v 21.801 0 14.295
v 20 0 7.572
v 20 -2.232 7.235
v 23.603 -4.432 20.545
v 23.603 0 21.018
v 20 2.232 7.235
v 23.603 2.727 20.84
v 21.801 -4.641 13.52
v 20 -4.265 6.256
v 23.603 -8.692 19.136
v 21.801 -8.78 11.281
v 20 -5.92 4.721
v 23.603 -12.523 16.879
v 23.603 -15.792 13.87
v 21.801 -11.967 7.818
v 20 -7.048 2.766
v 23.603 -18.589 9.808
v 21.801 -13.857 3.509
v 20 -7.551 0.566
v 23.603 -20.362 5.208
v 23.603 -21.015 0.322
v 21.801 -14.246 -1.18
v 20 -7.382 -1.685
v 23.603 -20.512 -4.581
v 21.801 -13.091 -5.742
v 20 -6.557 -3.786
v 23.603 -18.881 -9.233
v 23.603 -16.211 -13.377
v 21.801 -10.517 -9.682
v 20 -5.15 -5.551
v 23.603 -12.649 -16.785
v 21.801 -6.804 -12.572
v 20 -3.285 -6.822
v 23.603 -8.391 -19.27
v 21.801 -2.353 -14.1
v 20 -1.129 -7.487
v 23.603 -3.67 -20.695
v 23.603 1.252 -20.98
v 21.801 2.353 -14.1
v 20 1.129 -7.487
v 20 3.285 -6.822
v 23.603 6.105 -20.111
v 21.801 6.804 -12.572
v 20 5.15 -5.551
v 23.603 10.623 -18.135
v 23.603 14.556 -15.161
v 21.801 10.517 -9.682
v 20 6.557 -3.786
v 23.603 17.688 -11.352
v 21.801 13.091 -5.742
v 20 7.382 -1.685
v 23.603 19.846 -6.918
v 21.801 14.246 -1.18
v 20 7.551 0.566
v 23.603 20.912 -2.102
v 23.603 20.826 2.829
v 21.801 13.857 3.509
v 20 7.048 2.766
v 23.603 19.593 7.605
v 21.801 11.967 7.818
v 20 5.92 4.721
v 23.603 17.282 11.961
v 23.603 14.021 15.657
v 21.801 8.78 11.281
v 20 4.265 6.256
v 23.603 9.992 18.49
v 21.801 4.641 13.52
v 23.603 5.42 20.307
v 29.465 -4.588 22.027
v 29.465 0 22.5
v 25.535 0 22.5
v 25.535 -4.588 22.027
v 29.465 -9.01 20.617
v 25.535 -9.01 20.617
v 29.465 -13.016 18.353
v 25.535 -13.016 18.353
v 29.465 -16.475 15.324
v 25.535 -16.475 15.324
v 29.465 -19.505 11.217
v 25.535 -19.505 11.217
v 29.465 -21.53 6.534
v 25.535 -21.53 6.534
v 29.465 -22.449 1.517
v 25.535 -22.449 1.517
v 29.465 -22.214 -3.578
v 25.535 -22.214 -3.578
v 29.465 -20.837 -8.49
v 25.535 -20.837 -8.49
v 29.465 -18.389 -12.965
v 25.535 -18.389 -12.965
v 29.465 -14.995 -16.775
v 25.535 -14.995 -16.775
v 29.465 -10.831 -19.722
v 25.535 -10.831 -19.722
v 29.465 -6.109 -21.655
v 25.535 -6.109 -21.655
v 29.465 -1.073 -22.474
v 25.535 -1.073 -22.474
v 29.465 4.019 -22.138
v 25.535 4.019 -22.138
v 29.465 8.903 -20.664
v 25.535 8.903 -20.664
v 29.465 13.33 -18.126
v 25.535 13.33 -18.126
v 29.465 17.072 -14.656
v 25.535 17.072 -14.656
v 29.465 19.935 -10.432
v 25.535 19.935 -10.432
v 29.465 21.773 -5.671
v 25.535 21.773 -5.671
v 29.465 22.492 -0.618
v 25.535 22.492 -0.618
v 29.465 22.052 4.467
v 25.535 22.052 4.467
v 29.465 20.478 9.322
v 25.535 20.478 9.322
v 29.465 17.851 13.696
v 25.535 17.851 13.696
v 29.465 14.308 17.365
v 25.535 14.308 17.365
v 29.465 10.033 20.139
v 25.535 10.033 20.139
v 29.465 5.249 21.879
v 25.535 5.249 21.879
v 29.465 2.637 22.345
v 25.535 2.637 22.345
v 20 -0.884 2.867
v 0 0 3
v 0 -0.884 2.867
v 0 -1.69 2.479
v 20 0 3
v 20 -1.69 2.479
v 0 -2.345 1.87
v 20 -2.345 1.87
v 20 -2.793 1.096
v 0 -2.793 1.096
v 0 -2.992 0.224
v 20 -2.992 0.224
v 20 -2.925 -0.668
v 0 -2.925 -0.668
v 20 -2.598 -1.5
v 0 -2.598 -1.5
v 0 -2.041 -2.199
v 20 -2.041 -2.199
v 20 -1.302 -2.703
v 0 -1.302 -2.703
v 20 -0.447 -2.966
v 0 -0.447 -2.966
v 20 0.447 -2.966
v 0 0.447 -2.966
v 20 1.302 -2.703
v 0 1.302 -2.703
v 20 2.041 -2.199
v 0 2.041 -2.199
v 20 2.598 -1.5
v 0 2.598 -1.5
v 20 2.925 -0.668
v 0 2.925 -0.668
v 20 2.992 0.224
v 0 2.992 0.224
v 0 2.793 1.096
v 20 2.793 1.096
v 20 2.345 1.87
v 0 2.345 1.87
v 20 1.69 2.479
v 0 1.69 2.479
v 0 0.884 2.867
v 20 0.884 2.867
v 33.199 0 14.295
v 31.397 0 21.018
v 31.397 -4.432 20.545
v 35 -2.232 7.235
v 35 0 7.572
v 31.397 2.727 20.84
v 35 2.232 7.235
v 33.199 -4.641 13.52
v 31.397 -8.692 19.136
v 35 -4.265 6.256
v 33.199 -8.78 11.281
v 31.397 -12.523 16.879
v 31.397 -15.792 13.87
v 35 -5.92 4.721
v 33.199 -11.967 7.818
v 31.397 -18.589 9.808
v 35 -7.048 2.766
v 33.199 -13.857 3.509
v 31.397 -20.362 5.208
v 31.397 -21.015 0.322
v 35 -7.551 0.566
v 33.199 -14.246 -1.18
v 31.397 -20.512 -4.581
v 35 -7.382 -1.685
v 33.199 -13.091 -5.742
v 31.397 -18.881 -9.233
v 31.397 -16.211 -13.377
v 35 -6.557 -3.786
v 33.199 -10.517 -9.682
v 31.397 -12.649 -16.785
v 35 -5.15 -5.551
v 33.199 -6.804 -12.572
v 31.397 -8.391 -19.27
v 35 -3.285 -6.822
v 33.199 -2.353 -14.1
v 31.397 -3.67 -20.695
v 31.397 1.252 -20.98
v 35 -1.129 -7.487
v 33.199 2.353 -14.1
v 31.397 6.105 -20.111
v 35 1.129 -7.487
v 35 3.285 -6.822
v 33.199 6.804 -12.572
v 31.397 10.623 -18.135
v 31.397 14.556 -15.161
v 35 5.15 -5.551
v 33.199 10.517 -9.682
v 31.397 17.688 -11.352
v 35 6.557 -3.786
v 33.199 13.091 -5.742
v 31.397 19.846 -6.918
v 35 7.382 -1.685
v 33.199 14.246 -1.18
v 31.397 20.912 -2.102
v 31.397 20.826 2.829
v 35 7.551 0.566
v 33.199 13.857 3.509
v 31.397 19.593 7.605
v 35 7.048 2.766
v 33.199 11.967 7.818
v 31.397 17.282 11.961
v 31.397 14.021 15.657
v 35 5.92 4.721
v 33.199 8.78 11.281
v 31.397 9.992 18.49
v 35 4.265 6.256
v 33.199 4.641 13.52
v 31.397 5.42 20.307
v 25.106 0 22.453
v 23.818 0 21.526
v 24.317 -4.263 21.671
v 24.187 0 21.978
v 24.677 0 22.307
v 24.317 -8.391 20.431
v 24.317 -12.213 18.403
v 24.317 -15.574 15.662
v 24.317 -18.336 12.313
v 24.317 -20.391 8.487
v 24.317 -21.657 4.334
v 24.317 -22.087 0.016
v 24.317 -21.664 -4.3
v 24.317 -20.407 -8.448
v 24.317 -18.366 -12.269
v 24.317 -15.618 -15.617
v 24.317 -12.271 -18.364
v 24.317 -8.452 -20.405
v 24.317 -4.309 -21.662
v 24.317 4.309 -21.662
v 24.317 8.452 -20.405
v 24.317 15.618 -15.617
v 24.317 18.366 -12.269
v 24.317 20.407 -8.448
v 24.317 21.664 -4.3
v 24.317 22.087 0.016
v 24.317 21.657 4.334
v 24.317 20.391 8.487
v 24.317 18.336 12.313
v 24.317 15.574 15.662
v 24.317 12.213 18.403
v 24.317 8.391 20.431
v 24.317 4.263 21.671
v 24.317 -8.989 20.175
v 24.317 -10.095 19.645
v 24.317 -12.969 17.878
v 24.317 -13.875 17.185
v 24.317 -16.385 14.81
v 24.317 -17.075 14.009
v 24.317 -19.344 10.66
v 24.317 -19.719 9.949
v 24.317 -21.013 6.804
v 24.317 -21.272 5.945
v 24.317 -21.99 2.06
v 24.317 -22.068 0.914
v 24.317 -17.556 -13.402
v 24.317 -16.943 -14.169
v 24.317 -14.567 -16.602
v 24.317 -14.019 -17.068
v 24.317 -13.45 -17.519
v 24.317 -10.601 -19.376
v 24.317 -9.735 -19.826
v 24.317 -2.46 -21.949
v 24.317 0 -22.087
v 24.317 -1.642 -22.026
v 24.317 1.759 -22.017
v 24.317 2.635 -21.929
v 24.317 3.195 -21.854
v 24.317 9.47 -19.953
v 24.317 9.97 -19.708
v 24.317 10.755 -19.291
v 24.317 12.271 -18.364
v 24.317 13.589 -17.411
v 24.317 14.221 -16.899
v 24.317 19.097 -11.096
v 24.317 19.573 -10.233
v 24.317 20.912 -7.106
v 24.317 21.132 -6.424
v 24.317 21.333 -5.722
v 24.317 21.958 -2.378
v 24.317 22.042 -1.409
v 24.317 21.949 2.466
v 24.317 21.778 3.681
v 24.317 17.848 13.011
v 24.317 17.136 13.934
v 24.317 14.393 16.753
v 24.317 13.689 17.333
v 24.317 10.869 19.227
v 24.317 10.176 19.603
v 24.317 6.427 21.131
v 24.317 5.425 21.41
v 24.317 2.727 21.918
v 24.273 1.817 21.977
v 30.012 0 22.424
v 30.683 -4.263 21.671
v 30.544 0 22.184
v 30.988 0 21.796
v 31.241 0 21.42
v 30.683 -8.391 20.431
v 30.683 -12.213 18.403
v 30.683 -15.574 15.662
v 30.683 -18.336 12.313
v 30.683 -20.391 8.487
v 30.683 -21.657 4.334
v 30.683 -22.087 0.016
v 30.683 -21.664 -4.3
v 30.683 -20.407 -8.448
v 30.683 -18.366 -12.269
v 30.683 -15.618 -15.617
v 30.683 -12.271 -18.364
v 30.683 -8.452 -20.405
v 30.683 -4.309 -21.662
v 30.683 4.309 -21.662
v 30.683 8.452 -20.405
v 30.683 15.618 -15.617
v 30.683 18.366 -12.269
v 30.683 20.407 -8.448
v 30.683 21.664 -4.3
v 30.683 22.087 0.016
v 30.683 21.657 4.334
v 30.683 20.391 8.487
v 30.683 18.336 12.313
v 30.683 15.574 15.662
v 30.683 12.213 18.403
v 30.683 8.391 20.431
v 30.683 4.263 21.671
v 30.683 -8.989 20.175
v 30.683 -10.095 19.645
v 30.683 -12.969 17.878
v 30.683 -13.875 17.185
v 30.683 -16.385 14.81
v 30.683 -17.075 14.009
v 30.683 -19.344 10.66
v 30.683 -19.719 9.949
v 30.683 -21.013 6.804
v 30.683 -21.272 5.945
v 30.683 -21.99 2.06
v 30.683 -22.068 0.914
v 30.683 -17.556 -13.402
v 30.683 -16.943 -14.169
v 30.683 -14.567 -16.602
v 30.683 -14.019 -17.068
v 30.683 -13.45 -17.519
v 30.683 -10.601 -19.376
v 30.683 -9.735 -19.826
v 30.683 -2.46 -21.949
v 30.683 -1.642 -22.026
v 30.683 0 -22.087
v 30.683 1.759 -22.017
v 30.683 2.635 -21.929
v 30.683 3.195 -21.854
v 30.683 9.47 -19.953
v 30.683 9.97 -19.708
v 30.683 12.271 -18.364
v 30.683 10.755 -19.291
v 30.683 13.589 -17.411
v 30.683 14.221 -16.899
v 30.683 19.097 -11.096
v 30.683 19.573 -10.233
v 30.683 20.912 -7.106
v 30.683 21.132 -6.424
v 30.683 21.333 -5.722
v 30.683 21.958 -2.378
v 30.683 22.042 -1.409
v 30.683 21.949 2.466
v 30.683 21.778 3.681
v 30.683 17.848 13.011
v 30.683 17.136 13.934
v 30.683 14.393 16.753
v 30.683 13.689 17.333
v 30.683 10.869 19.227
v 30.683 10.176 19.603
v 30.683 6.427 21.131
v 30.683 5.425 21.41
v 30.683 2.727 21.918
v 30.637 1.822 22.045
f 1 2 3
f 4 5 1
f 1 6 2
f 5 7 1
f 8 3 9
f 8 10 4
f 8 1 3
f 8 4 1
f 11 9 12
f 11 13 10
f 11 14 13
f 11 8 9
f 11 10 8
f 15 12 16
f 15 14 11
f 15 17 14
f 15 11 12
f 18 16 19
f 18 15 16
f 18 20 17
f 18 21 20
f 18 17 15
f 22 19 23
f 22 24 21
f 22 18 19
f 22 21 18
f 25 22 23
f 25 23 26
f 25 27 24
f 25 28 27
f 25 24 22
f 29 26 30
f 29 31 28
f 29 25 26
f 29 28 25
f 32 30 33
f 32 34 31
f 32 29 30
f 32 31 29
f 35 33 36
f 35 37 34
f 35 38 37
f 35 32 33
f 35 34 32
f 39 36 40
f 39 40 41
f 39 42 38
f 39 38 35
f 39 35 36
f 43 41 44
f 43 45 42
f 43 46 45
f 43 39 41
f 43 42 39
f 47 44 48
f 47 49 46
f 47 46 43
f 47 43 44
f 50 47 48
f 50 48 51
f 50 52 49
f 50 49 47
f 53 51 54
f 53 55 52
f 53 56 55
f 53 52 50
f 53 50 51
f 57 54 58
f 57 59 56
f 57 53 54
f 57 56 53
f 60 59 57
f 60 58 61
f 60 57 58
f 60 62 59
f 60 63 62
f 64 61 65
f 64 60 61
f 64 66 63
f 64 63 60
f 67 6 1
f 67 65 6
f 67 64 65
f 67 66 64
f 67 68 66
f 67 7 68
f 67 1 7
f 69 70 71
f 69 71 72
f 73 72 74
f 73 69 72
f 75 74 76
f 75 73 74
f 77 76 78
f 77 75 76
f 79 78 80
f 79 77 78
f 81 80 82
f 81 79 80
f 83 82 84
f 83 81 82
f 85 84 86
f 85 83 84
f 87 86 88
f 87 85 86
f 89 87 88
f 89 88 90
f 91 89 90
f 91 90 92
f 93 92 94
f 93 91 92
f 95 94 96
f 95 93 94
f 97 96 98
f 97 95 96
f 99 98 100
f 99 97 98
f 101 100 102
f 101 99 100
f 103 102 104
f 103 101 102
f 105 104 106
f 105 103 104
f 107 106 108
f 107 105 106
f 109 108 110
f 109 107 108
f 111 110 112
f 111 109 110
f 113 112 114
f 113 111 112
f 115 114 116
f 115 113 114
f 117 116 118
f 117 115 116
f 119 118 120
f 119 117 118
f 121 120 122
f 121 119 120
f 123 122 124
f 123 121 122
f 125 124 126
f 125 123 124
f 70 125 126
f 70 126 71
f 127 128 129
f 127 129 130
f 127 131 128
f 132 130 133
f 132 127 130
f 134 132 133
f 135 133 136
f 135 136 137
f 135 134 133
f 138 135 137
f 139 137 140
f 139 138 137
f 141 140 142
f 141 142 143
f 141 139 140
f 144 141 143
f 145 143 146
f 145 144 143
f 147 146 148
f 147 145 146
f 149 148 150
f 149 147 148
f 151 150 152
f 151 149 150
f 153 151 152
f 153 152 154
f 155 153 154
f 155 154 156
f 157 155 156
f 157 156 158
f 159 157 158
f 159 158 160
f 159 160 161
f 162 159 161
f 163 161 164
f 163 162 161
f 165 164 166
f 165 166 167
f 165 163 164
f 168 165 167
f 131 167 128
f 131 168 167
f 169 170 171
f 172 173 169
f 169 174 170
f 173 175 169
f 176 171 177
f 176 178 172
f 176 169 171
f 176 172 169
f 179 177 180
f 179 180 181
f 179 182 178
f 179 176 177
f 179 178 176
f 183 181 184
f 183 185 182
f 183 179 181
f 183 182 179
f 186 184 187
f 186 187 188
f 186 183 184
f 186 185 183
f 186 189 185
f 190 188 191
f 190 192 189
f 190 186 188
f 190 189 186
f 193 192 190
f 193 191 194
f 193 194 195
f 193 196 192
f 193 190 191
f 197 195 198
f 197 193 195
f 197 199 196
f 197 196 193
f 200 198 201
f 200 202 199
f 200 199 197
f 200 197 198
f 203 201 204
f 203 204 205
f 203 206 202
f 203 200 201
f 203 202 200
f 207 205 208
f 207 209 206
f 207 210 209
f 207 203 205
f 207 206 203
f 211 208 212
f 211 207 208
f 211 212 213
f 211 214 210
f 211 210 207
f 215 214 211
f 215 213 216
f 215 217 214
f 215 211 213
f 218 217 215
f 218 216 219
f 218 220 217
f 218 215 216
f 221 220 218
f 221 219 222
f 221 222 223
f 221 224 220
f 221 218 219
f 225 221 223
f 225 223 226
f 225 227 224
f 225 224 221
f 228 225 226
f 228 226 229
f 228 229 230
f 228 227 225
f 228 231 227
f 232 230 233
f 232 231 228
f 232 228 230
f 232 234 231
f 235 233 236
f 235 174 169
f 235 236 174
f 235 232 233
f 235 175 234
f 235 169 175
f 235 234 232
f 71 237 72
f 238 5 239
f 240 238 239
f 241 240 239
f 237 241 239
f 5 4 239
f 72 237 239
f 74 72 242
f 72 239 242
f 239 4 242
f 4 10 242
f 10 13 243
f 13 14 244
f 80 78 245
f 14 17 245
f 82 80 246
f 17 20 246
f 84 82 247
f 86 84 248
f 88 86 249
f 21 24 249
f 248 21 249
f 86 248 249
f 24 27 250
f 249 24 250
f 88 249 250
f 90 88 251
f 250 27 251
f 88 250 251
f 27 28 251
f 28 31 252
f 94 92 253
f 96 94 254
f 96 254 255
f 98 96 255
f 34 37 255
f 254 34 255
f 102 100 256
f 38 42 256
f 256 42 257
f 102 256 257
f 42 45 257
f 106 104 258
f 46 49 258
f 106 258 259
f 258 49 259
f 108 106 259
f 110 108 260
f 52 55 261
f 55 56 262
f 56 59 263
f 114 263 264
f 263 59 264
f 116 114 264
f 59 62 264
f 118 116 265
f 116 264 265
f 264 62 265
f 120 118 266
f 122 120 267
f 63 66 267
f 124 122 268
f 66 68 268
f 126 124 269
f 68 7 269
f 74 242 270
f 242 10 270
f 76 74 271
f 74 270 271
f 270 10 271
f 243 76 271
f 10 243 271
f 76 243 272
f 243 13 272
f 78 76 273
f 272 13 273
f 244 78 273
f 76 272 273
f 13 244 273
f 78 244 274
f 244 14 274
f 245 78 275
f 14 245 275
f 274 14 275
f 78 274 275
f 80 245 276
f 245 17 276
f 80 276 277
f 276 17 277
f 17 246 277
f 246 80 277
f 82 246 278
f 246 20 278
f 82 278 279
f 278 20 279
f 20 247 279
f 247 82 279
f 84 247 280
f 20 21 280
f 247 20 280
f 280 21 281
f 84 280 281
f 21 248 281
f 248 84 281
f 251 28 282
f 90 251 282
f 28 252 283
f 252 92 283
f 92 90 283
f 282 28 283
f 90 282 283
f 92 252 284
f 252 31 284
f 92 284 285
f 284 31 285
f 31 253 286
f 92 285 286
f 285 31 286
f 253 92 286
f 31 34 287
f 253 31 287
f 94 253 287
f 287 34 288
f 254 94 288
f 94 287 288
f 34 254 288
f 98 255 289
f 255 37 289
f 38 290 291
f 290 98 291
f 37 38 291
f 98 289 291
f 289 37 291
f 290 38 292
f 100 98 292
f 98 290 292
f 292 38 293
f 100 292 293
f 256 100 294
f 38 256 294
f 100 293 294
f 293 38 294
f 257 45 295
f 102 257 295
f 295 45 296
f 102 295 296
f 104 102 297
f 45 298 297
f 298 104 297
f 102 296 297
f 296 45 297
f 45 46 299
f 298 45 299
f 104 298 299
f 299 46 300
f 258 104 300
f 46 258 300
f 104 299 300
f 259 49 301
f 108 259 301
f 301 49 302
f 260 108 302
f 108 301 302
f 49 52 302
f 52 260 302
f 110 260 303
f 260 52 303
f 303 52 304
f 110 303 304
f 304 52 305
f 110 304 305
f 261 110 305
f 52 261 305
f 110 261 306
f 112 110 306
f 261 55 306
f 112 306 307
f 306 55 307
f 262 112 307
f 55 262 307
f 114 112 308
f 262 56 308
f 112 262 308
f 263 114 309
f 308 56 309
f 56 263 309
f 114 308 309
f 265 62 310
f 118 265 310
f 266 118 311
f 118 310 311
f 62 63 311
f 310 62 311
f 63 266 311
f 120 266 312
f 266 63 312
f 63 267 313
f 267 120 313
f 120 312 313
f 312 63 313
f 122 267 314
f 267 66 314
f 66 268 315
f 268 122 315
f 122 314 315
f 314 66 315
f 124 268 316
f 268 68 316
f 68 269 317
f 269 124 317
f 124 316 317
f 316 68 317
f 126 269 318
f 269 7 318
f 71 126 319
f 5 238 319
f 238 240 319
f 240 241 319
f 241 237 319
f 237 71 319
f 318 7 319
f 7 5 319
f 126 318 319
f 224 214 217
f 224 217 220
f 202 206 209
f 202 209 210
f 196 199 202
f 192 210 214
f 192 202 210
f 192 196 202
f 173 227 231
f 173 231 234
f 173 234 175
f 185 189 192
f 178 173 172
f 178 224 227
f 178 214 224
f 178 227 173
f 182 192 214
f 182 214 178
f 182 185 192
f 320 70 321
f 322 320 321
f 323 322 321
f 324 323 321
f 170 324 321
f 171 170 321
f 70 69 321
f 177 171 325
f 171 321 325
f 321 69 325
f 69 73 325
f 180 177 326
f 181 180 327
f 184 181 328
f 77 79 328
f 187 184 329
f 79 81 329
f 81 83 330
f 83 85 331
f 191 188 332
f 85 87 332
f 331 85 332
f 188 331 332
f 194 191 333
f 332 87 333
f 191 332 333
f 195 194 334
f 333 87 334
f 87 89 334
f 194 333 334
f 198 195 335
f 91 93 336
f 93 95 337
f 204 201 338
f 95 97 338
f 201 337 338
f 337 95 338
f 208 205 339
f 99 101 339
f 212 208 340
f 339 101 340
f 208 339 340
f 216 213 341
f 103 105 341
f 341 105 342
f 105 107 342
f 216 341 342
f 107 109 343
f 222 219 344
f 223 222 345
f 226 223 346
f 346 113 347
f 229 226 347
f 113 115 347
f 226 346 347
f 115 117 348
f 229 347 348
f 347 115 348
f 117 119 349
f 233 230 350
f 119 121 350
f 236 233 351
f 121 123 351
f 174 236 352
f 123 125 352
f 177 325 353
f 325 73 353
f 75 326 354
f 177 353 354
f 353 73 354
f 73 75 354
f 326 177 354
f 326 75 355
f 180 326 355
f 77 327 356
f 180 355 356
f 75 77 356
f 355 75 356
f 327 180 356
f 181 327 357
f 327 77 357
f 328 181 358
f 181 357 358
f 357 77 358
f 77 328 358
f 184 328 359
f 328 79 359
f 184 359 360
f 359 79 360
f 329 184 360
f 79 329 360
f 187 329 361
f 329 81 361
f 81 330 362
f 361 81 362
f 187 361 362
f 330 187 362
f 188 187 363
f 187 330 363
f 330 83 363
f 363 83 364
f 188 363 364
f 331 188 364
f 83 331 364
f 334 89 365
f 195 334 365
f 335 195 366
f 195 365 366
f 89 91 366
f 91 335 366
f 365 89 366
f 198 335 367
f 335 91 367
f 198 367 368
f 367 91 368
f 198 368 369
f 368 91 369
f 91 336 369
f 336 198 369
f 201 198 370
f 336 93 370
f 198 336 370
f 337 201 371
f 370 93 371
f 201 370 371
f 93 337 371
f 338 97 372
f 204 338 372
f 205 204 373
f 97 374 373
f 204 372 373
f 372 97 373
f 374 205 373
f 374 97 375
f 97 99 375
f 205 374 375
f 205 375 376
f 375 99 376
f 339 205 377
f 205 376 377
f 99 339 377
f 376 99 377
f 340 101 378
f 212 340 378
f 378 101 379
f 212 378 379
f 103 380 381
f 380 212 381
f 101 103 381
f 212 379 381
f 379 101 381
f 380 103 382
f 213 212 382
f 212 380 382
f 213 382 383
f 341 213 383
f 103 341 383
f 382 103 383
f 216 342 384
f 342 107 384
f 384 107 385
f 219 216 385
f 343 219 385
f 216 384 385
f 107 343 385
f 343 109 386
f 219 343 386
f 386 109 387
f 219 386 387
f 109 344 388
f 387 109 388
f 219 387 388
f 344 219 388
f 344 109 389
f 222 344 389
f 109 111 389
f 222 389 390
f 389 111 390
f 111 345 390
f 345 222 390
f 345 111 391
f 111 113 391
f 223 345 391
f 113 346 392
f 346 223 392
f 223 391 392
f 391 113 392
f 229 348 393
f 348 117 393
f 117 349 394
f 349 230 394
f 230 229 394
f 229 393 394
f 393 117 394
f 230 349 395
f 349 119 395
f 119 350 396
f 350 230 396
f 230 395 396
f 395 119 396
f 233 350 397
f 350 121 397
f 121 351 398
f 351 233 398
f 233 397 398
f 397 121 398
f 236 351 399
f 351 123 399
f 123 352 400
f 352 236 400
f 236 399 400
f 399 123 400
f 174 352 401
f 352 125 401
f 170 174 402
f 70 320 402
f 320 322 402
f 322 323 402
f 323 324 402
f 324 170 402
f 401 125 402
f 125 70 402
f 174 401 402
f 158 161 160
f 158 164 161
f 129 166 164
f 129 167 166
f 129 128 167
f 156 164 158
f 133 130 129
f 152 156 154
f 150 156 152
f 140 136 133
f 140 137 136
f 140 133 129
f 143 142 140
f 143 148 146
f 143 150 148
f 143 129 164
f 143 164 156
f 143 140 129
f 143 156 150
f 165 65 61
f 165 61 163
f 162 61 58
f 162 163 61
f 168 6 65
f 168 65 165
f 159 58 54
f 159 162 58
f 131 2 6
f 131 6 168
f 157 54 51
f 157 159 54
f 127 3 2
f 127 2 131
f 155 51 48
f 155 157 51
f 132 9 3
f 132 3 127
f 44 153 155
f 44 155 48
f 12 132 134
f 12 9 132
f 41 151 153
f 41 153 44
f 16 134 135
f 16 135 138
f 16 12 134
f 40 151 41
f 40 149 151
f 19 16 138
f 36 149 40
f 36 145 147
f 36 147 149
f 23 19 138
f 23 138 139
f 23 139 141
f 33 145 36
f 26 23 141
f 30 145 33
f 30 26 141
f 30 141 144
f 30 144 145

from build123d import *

# Parameters (mm, degrees)
FILLET_1_R = 2


with BuildPart() as part:
    # Эскиз1 → Повернуть1 (revolve)
    with BuildSketch(Plane.XY, mode=Mode.PRIVATE) as revolve_1_sk:
        Polygon((0, 0), (0, 3), (20, 3), (20, 7.57179677), (24, 22.5), (31, 22.5), (35, 7.57179677), (35, 0), (26, 0), align=None)
    revolve(revolve_1_sk.sketch.rotate(Axis((0, 0, 0), (1, 0, 0)), 90), axis=Axis((0, 0, 0), (1, 0, 0)))

    # Скругление1
    fillet_1_edges = [part.edges().sort_by_distance(p)[0] for p in [
        (31, 0, -22.5),
        (24, 0, -22.5),
    ]]
    fillet(fillet_1_edges, radius=FILLET_1_R)


solid = part.part
